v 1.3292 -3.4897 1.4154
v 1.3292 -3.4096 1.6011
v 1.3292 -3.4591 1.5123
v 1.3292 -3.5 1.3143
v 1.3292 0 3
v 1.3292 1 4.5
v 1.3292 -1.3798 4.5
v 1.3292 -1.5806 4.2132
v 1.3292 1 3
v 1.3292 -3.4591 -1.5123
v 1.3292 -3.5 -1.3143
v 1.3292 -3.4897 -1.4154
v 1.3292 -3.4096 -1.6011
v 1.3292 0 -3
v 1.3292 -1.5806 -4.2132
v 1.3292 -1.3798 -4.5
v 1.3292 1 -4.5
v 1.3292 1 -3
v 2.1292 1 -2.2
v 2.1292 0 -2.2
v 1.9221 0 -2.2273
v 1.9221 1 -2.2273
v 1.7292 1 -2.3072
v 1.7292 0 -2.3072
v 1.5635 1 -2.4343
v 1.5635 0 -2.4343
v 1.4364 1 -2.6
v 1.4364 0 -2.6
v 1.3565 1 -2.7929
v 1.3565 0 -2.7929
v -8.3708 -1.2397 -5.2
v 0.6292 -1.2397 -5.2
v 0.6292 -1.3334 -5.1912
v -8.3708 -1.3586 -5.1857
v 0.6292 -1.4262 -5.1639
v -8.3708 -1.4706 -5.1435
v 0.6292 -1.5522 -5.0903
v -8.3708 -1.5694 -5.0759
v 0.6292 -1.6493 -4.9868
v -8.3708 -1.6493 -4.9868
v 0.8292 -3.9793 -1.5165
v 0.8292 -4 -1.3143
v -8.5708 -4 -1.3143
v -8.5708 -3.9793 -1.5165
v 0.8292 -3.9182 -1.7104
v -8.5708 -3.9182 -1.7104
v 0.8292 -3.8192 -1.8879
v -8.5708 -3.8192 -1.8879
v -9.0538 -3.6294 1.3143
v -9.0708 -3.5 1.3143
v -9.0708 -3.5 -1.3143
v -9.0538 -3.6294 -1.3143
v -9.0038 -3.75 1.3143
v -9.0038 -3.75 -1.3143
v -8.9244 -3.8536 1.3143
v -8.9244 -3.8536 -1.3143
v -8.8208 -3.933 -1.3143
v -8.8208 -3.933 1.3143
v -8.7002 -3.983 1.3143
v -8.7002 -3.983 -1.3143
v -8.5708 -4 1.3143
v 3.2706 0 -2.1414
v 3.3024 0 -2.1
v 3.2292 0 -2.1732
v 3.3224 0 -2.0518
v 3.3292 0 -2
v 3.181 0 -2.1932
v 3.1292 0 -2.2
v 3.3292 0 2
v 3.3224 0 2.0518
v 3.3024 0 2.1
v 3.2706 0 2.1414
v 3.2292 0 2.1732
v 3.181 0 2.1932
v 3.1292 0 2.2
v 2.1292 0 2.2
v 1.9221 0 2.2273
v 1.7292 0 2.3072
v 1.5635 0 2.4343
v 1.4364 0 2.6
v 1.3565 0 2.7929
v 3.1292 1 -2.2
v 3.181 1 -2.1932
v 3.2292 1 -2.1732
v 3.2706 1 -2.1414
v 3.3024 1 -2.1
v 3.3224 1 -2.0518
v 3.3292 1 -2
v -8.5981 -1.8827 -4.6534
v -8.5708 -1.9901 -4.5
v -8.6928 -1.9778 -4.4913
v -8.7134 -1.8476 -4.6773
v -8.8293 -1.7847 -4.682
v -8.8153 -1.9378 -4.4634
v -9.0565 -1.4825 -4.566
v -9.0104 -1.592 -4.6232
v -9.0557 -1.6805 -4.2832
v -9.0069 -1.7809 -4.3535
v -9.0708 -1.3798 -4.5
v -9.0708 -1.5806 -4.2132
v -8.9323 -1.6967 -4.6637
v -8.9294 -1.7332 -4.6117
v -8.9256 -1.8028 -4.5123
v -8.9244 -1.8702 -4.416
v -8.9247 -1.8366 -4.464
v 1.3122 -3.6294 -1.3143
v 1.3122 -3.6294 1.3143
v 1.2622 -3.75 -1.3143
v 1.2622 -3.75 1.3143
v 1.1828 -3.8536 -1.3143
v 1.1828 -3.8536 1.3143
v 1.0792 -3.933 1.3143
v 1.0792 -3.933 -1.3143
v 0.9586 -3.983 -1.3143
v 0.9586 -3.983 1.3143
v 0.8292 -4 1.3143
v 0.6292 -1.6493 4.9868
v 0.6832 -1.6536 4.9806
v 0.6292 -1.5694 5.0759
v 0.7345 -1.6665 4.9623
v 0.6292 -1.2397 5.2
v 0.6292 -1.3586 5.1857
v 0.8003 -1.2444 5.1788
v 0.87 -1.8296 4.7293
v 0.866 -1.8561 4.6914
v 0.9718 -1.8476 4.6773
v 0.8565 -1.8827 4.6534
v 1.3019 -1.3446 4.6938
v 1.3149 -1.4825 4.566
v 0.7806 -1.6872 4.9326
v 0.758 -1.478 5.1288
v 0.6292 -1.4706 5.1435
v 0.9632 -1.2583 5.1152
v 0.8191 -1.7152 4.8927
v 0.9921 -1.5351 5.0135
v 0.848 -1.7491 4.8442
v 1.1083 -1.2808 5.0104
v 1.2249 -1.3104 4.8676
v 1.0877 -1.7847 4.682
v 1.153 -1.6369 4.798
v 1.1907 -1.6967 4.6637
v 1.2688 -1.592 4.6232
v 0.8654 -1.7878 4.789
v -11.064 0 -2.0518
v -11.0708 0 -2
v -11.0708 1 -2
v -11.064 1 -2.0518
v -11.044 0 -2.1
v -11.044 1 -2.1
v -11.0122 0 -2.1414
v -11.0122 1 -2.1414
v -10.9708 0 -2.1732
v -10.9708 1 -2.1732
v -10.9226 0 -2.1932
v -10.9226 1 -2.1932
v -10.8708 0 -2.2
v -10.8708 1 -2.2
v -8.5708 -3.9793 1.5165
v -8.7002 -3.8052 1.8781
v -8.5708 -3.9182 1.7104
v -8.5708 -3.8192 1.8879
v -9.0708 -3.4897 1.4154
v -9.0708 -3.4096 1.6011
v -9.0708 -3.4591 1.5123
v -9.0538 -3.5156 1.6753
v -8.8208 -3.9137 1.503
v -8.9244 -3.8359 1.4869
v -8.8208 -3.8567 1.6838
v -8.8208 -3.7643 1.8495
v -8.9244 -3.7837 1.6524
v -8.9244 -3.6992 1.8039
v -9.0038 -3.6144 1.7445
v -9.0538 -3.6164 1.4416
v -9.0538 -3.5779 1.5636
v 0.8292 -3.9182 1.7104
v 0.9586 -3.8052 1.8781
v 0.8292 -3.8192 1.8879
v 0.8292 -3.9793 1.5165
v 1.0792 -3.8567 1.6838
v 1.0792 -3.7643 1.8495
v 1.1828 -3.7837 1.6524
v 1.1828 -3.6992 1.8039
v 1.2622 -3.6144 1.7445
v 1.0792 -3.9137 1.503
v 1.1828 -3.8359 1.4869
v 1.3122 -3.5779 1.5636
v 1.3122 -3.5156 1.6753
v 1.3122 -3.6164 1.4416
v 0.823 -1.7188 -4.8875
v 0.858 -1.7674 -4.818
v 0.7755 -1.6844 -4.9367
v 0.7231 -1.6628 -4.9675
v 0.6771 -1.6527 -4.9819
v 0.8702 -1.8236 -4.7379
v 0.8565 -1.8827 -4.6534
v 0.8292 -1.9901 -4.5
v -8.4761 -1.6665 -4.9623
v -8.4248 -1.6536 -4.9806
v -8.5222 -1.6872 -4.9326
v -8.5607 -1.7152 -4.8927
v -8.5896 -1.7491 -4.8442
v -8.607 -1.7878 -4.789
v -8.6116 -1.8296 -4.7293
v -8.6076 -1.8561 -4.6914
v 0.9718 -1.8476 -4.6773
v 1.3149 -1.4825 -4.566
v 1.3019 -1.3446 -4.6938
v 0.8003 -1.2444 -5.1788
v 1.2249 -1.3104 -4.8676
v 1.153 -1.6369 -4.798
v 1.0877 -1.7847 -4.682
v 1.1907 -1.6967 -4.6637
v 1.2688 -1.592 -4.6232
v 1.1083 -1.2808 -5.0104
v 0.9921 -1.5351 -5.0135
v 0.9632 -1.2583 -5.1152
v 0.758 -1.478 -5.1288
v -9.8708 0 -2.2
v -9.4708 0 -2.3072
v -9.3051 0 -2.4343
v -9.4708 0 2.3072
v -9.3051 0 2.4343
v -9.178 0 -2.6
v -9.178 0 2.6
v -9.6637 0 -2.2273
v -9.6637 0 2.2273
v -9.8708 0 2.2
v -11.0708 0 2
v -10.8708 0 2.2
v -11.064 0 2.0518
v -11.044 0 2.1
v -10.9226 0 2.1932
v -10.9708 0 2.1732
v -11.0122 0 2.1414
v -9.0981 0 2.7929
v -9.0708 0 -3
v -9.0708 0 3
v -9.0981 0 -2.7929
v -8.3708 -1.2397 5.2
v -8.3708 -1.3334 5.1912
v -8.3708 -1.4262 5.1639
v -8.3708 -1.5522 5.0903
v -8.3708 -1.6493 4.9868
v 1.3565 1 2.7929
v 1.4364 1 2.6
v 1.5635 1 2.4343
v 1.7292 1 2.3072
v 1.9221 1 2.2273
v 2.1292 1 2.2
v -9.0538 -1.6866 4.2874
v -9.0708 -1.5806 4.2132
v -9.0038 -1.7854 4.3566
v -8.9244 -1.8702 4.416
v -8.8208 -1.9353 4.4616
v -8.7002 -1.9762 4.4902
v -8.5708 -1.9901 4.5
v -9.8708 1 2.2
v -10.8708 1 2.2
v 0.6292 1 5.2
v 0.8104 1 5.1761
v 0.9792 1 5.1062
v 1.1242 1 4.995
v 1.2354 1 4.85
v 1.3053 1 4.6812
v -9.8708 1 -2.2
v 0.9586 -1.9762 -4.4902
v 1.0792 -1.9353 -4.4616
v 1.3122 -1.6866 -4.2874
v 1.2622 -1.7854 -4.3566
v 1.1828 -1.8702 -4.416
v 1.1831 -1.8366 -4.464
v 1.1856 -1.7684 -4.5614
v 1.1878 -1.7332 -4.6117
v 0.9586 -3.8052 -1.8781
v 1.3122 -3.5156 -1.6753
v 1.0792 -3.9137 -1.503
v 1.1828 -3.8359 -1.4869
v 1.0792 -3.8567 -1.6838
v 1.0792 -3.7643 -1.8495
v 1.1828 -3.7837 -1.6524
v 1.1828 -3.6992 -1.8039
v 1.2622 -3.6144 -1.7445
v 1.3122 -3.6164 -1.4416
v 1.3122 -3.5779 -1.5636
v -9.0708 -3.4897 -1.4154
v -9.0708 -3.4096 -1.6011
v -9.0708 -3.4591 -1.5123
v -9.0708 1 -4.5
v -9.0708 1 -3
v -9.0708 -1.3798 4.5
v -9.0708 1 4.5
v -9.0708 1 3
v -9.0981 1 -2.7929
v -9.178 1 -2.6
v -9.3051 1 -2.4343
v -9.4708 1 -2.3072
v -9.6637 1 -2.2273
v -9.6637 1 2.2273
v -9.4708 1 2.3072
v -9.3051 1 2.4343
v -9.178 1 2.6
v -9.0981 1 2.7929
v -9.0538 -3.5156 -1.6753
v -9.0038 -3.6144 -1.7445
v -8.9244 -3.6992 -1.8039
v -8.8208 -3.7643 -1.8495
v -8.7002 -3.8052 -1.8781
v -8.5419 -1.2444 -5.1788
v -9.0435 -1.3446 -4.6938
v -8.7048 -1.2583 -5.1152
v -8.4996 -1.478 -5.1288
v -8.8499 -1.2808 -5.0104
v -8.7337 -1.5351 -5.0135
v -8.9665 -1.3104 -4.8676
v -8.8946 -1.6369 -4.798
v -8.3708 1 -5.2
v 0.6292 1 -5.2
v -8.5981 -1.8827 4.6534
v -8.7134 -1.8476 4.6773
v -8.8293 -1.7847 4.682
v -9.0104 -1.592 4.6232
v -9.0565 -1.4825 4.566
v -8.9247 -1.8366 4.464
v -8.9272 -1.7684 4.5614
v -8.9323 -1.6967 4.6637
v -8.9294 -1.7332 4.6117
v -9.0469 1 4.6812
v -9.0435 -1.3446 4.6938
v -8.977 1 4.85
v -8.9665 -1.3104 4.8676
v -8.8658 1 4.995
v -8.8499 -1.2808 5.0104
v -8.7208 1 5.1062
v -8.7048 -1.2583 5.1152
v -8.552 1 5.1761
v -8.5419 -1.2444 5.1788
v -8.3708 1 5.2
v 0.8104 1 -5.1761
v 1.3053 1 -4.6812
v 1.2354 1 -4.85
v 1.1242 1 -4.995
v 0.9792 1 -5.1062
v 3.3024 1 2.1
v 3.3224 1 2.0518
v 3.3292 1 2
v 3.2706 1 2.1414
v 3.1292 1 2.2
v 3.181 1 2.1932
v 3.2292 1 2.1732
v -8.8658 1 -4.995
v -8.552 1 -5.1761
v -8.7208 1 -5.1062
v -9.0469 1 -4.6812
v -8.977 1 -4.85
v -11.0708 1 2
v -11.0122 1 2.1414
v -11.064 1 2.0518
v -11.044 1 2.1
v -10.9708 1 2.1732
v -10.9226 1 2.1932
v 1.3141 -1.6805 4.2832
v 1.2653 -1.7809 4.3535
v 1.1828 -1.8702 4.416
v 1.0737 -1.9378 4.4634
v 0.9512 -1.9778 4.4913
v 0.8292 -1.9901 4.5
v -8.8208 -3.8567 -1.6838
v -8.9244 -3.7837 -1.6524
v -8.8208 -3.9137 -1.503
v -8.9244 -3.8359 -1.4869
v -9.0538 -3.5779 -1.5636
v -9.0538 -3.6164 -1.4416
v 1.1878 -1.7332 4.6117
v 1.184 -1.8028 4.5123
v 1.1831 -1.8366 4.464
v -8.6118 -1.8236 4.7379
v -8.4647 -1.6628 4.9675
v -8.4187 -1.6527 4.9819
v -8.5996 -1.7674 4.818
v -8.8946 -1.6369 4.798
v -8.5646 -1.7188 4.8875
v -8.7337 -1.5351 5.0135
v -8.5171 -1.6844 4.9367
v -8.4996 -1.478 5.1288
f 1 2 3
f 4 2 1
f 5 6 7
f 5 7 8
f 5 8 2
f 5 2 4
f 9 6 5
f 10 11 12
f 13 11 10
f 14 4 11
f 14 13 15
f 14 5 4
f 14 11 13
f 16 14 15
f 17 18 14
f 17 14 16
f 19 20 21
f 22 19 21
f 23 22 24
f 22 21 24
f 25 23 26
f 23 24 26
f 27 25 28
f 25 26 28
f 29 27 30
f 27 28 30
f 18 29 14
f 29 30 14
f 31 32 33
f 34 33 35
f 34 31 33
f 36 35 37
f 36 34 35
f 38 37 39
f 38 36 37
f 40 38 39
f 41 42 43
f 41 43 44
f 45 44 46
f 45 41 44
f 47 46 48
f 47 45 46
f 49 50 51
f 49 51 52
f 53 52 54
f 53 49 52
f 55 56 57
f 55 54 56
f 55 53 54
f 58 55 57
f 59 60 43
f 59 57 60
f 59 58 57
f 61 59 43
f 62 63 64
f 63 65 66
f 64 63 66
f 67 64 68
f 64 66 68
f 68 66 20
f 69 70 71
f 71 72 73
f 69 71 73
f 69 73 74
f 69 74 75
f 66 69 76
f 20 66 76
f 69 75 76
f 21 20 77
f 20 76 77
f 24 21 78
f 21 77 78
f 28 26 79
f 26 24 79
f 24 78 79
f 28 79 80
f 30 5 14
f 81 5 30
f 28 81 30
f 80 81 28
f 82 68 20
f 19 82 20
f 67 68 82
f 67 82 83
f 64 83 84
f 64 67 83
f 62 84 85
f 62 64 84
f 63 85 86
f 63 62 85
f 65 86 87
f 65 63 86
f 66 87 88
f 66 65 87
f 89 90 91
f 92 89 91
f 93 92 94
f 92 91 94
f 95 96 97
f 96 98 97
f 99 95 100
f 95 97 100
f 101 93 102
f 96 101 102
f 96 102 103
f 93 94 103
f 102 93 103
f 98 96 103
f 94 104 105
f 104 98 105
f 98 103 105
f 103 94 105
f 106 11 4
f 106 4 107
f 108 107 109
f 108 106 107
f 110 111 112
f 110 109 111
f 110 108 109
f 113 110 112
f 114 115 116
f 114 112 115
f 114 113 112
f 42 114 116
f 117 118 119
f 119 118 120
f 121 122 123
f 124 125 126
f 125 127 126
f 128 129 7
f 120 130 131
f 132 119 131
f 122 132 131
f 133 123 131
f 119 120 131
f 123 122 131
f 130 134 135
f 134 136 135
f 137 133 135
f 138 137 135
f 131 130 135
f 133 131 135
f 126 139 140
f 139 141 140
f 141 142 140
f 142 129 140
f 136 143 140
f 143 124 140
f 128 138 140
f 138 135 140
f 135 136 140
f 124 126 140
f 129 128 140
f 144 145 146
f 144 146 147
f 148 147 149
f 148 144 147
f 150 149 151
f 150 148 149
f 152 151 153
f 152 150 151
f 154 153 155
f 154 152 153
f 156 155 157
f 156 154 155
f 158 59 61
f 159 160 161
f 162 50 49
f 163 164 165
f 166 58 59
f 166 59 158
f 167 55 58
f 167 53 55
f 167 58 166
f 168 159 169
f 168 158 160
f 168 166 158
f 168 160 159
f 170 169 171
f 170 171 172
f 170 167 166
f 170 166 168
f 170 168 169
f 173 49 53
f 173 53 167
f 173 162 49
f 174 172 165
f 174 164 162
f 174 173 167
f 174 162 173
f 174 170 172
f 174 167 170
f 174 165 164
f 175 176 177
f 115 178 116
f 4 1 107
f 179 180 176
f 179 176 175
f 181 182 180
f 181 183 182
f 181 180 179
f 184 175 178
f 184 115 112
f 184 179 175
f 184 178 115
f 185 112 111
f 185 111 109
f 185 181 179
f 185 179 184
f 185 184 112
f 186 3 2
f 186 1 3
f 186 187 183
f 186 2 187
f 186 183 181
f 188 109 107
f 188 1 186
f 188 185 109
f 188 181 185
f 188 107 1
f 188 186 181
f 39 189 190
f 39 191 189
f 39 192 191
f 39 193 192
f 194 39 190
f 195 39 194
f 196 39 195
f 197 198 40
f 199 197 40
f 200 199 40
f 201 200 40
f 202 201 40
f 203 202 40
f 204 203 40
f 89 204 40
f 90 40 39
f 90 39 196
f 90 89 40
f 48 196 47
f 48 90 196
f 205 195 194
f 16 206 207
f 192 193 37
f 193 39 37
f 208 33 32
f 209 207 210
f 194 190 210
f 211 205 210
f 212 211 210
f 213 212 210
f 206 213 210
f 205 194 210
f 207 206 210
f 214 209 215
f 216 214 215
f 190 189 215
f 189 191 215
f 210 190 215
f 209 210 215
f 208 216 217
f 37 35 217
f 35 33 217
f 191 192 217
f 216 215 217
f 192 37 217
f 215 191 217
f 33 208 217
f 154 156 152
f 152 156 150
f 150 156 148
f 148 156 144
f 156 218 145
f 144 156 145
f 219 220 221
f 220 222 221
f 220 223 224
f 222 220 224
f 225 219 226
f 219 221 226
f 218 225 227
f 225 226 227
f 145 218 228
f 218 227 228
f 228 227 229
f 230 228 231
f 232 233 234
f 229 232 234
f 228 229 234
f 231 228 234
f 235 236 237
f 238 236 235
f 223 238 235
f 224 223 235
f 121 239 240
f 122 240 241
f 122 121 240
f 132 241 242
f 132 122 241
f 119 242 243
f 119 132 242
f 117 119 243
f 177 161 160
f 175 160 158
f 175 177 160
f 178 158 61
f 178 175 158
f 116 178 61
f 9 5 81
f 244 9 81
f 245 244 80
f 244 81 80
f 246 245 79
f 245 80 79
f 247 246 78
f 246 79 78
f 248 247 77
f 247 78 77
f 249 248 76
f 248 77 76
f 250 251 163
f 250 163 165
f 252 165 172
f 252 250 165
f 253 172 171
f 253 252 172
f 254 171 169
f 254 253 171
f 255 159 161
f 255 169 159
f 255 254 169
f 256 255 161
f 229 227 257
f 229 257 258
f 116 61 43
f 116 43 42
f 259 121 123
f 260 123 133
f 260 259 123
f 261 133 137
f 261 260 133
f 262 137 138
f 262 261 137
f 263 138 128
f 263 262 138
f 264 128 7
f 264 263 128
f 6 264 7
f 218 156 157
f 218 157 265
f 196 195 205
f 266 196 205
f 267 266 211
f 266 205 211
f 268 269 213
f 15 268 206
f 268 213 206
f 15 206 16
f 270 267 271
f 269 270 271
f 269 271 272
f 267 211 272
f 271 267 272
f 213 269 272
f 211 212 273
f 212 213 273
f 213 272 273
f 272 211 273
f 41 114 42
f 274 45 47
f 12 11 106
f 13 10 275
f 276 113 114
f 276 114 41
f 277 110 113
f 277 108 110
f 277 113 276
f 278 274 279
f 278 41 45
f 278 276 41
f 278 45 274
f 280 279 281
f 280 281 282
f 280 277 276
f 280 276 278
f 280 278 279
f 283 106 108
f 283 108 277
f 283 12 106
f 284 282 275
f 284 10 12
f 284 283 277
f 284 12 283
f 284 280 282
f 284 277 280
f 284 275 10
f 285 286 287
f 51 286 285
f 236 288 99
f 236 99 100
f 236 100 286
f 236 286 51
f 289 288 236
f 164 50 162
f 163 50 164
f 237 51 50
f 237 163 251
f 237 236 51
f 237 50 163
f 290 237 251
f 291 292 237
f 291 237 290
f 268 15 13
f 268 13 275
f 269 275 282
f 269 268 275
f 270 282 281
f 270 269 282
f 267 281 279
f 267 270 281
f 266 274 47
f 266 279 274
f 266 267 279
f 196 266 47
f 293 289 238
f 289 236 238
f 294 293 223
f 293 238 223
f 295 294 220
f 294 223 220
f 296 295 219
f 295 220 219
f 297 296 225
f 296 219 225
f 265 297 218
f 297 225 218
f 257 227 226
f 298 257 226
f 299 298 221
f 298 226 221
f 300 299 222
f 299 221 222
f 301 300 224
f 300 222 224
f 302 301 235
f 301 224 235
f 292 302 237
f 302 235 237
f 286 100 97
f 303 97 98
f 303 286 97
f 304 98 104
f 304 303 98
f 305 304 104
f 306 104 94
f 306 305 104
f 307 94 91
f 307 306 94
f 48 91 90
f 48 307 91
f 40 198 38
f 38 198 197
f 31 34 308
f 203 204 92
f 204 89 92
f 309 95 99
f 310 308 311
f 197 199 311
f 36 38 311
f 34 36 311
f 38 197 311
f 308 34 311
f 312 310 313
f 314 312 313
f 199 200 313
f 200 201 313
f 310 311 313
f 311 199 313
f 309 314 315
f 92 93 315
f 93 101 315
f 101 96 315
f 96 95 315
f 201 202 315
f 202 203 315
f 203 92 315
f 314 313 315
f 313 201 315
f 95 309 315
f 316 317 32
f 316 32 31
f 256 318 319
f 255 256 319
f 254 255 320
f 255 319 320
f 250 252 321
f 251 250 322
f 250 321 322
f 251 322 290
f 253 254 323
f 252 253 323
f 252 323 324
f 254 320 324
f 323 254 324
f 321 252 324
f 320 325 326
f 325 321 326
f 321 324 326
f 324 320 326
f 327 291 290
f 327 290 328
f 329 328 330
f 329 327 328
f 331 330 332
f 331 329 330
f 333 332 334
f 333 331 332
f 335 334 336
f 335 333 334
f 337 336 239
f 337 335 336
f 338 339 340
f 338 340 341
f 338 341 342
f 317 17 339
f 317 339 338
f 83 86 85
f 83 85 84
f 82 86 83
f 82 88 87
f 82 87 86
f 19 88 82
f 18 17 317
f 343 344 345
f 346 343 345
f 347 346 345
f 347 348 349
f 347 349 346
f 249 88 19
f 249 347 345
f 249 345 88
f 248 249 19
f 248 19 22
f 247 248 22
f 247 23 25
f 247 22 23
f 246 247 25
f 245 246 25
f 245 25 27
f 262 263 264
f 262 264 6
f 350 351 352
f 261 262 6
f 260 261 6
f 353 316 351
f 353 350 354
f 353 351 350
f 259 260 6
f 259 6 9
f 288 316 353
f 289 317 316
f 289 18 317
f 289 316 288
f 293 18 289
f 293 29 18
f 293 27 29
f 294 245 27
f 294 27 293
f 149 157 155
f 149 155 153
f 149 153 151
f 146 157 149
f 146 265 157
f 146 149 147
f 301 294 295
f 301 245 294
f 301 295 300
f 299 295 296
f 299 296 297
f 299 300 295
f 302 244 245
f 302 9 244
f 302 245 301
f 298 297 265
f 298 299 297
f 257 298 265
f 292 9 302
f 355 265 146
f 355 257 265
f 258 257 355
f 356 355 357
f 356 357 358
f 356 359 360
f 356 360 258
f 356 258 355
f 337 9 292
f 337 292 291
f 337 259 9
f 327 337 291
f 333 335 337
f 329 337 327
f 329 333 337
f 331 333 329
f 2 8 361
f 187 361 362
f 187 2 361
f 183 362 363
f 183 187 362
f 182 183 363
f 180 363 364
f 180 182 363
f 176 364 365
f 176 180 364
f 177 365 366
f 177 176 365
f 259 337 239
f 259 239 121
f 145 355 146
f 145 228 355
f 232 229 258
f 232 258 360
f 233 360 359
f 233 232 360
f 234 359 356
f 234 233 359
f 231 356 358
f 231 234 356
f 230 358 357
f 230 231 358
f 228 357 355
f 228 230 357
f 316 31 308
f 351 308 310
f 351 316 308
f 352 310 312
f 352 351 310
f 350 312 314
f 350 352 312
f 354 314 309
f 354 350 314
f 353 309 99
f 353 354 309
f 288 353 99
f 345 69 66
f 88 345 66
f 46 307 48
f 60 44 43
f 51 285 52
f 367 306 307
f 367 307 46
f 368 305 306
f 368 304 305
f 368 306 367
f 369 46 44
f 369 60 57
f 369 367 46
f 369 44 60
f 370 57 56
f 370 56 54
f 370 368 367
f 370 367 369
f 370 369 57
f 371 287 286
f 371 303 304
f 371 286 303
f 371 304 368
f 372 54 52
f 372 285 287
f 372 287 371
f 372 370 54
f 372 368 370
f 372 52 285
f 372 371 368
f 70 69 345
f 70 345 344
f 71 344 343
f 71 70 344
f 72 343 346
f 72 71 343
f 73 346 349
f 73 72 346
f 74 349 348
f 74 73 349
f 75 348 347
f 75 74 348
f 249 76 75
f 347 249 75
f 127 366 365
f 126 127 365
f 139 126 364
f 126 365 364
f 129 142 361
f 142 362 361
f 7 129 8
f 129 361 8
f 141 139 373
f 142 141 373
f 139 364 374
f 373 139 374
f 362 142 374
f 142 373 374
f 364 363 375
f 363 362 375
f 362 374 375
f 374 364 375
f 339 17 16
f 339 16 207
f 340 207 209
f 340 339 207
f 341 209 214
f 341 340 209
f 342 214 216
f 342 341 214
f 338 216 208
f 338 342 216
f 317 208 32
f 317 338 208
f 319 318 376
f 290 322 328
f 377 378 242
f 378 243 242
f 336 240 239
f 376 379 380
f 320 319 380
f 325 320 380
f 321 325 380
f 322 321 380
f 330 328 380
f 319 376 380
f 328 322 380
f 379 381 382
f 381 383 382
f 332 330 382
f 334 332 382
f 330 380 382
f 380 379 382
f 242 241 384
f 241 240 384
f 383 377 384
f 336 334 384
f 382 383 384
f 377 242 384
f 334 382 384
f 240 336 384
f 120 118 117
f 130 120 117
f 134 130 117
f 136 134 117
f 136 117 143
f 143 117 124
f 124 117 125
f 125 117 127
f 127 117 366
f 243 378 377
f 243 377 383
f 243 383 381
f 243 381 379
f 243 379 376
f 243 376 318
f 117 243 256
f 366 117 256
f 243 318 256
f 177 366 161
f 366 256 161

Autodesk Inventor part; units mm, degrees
ref_plane "YZ Plane" through (0, 0, 0) normal (1, 0, 0) x (0, 1, 0)
ref_plane "XZ Plane" through (0, 0, 0) normal (0, 1, 0) x (-1, 0, 0)
ref_plane "XY Plane" through (0, 0, 0) normal (0, 0, 1) x (1, 0, 0)
sketch "Эскиз1" plane through (0, 0, 0) normal (0, 1, 0) x (-1, 0, 0)
  line L0 (9.3708, 3) -> (9.3708, -3) projected
  line L1 (9.3708, -3) -> (9.3708, -4.5) projected
  arc A0 (8.3708, -5.5) -> (9.3708, -4.5) centre (8.3708, -4.5) ccw projected
  line L2 (8.3708, -5.5) -> (-0.6292, -5.5) projected
  arc A1 (-1.6292, -4.5) -> (-0.6292, -5.5) centre (-0.6292, -4.5) ccw projected
  line L3 (-1.6292, -4.5) -> (-1.6292, -3) projected
  arc A2 (-1.6292, -3) -> (-2.1292, -2.5) centre (-2.1292, -3) ccw projected
  line L4 (-3.1292, -2.5) -> (-2.1292, -2.5) projected
  arc A3 (-3.6292, -2) -> (-3.1292, -2.5) centre (-3.1292, -2) ccw projected
  line L5 (-3.6292, 2) -> (-3.6292, -2) projected
  arc A4 (-3.1292, 2.5) -> (-3.6292, 2) centre (-3.1292, 2) ccw projected
  line L6 (-2.1292, 2.5) -> (-3.1292, 2.5) projected
  arc A5 (-2.1292, 2.5) -> (-1.6292, 3) centre (-2.1292, 3) ccw projected
  line L7 (-1.6292, 3) -> (-1.6292, 4.5) projected
  arc A6 (-0.6292, 5.5) -> (-1.6292, 4.5) centre (-0.6292, 4.5) ccw projected
  line L8 (-0.6292, 5.5) -> (8.3708, 5.5) projected
  arc A7 (9.3708, 4.5) -> (8.3708, 5.5) centre (8.3708, 4.5) ccw projected
  line L9 (9.3708, 4.5) -> (9.3708, 3) projected
  arc A8 (6.8708, 1.5) -> (5.3708, 3) centre (5.3708, 1.5) ccw projected
  line L10 (2.3708, 3) -> (5.3708, 3) projected
  arc A9 (2.3708, 3) -> (0.8708, 1.5) centre (2.3708, 1.5) ccw projected
  line L11 (0.8708, -1.5) -> (0.8708, 1.5) projected
  arc A10 (0.8708, -1.5) -> (2.3708, -3) centre (2.3708, -1.5) ccw projected
  line L12 (5.3708, -3) -> (2.3708, -3) projected
  arc A11 (5.3708, -3) -> (6.8708, -1.5) centre (5.3708, -1.5) ccw projected
  line L13 (6.8708, 1.5) -> (6.8708, -1.5) projected
  arc A12 (9.8708, -2.5) -> (9.3708, -3) centre (9.8708, -3) ccw projected
  line L14 (9.3708, 3) -> (9.3708, -3) projected
  arc A13 (9.3708, 3) -> (9.8708, 2.5) centre (9.8708, 3) ccw projected
  line L15 (10.8708, 2.5) -> (9.8708, 2.5) projected
  arc A14 (11.3708, 2) -> (10.8708, 2.5) centre (10.8708, 2) ccw projected
  line L16 (11.3708, -2) -> (11.3708, 2) projected
  arc A15 (10.8708, -2.5) -> (11.3708, -2) centre (10.8708, -2) ccw projected
  line L17 (9.8708, -2.5) -> (10.8708, -2.5) projected
  line L18 (9.0708, 3) -> (9.0708, 4.5)
  arc A16 (9.0708, 4.5) -> (8.3708, 5.2) centre (8.3708, 4.5) ccw
  line L19 (8.3708, 5.2) -> (-0.6292, 5.2)
  arc A17 (-0.6292, 5.2) -> (-1.3292, 4.5) centre (-0.6292, 4.5) ccw
  line L20 (-1.3292, 4.5) -> (-1.3292, 3)
  arc A18 (-2.1292, 2.2) -> (-1.3292, 3) centre (-2.1292, 3) ccw
  line L21 (-2.1292, 2.2) -> (-3.1292, 2.2)
  arc A19 (-3.1292, 2.2) -> (-3.3292, 2) centre (-3.1292, 2) ccw
  line L22 (-3.3292, 2) -> (-3.3292, -2)
  arc A20 (-3.3292, -2) -> (-3.1292, -2.2) centre (-3.1292, -2) ccw
  line L23 (-3.1292, -2.2) -> (-2.1292, -2.2)
  arc A21 (-1.3292, -3) -> (-2.1292, -2.2) centre (-2.1292, -3) ccw
  line L24 (-1.3292, -3) -> (-1.3292, -4.5)
  arc A22 (-1.3292, -4.5) -> (-0.6292, -5.2) centre (-0.6292, -4.5) ccw
  line L25 (-0.6292, -5.2) -> (8.3708, -5.2)
  arc A23 (8.3708, -5.2) -> (9.0708, -4.5) centre (8.3708, -4.5) ccw
  line L26 (9.0708, -4.5) -> (9.0708, -3)
  arc A24 (9.0708, 3) -> (9.8708, 2.2) centre (9.8708, 3) ccw
  line L27 (9.8708, 2.2) -> (10.8708, 2.2)
  arc A25 (11.0708, 2) -> (10.8708, 2.2) centre (10.8708, 2) ccw
  line L28 (11.0708, 2) -> (11.0708, -2)
  arc A26 (10.8708, -2.2) -> (11.0708, -2) centre (10.8708, -2) ccw
  line L29 (10.8708, -2.2) -> (9.8708, -2.2)
  arc A27 (9.8708, -2.2) -> (9.0708, -3) centre (9.8708, -3) ccw
  point P0 (0, 0)
  dimension "d0" = 0.3
  dimension "d1" = 0.3
extrude "Выдавливание1" add sketch "Эскиз1" along normal blind 1 contours A24 L27 A25 L28 A26 L29 A27 L0 | L0 A27 L26 A23 L25 A22 L24 A21 L23 A20 L22 A19 L21 A18 L20 A17 L19 A16 L18 A24 | L13 A11 L12 A10 L11 A9 L10 A8
sketch "Эскиз2" plane through (0, 0, 0) normal (0, -1, 0) x (1, 0, 0)
  arc A0 (-8.3708, 5.2) -> (-9.0708, 4.5) centre (-8.3708, 4.5) ccw projected
  line L0 (-9.0708, 3) -> (-9.0708, 4.5) projected
  arc A1 (-9.8708, 2.2) -> (-9.0708, 3) centre (-9.8708, 3) ccw projected
  line L1 (-10.8708, 2.2) -> (-9.8708, 2.2) projected
  arc A2 (-10.8708, 2.2) -> (-11.0708, 2) centre (-10.8708, 2) ccw projected
  line L2 (-11.0708, -2) -> (-11.0708, 2) projected
  arc A3 (-11.0708, -2) -> (-10.8708, -2.2) centre (-10.8708, -2) ccw projected
  line L3 (-9.8708, -2.2) -> (-10.8708, -2.2) projected
  arc A4 (-9.0708, -3) -> (-9.8708, -2.2) centre (-9.8708, -3) ccw projected
  line L4 (-9.0708, -4.5) -> (-9.0708, -3) projected
  arc A5 (-9.0708, -4.5) -> (-8.3708, -5.2) centre (-8.3708, -4.5) ccw projected
  line L5 (0.6292, -5.2) -> (-8.3708, -5.2) projected
  arc A6 (0.6292, -5.2) -> (1.3292, -4.5) centre (0.6292, -4.5) ccw projected
  line L6 (1.3292, -3) -> (1.3292, -4.5) projected
  arc A7 (2.1292, -2.2) -> (1.3292, -3) centre (2.1292, -3) ccw projected
  line L7 (3.1292, -2.2) -> (2.1292, -2.2) projected
  arc A8 (3.1292, -2.2) -> (3.3292, -2) centre (3.1292, -2) ccw projected
  line L8 (3.3292, 2) -> (3.3292, -2) projected
  arc A9 (3.3292, 2) -> (3.1292, 2.2) centre (3.1292, 2) ccw projected
  line L9 (2.1292, 2.2) -> (3.1292, 2.2) projected
  arc A10 (1.3292, 3) -> (2.1292, 2.2) centre (2.1292, 3) ccw projected
  line L10 (1.3292, 4.5) -> (1.3292, 3) projected
  arc A11 (1.3292, 4.5) -> (0.6292, 5.2) centre (0.6292, 4.5) ccw projected
  line L11 (-8.3708, 5.2) -> (0.6292, 5.2) projected
  arc A12 (-9.8708, 2.2) -> (-9.0708, 3) centre (-9.8708, 3) ccw projected
  line L12 (-9.0708, -3) -> (-9.0708, 3)
  line L13 (1.3292, 3) -> (1.3292, -3)
  point P0 (0, 0)
extrude "Выдавливание2" add sketch "Эскиз2" along normal blind 4 contours L11 A11 L10 L13 L6 A6 L5 A5 L4 L12 L0 A0
sketch "Эскиз3" plane through (-9.0708, 0, -3) normal (-1, 0, 0) x (0, 0, 1)
  line L0 (0, 0) -> (0, 1) projected
  line L1 (-1.5, 1) -> (0, 1) projected
  line L2 (-1.5, -4) -> (-1.5, 1) projected
  line L3 (7.5, -4) -> (-1.5, -4) projected
  line L4 (7.5, 1) -> (7.5, -4) projected
  line L5 (6, 1) -> (7.5, 1) projected
  line L6 (6, 0) -> (6, 1) projected
  line L7 (0, 0) -> (6, 0) projected
  line L8 (7.5, 1) -> (8.2, 1) projected
  line L9 (7.5, 1) -> (7.5, -4) projected
  line L10 (-1.5, -4) -> (-1.5, 1) projected
  line L11 (-2.2, 1) -> (-1.5, 1) projected
  line L12 (-2.2, -4) -> (-2.2, 1) projected
  line L13 (-1.5, -4) -> (-2.2, -4) projected
  line L14 (8.2, 1) -> (7.5, 1) projected
  line L15 (8.2, -1.5) -> (4.6296, -4)
  line L16 (7.5, -4) -> (-1.5, -4) projected
  line L17 (-1.5, 1) -> (-2.2, 1) projected
  line L18 (-2.2, 1) -> (-2.2, -1.5)
  line L19 (-2.2, -4) -> (-2.2, 1) projected
  line L20 (-2.2, -1.5) -> (1.3704, -4)
  line L21 (7.5, 1) -> (7.5, -4) projected
  line L22 (8.2, -4) -> (8.2, 1) projected
  line L23 (7.5, -4) -> (8.2, -4) projected
  line L24 (8.2, 1) -> (8.2, -1.5)
  point P0 (3, 0)
  point P1 (-2.2, -1.5)
  dimension "d8" = 2.5
  dimension "d9" = 35
  dimension "d10" = 35
  dimension "d14" = 2.5
extrude "Выдавливание3" cut sketch "Эскиз3" against normal blind 15 contours L20 L3 L2 | L2 L13 L12 L20 | L15 L22 L23 L4 | L4 L3 L15
fillet "Сопряжение2" radius 1 2 edges at (-3.8708, -4, -1.6296) (-3.8708, -4, 1.6296)
fillet "Сопряжение3" radius 0.5 8 edges at (-9.0708, -2.9046, 3.194) (-8.8657, -1.6436, 4.995) (-3.8708, -1.5, 5.2) (1.1242, -1.6436, 4.995) (1.3292, -2.9046, 3.194) (1.1242, -1.6436, -4.995) (-3.8708, -1.5, -5.2) (-8.8657, -1.6436, -4.995)
properties part number "pinatel"
